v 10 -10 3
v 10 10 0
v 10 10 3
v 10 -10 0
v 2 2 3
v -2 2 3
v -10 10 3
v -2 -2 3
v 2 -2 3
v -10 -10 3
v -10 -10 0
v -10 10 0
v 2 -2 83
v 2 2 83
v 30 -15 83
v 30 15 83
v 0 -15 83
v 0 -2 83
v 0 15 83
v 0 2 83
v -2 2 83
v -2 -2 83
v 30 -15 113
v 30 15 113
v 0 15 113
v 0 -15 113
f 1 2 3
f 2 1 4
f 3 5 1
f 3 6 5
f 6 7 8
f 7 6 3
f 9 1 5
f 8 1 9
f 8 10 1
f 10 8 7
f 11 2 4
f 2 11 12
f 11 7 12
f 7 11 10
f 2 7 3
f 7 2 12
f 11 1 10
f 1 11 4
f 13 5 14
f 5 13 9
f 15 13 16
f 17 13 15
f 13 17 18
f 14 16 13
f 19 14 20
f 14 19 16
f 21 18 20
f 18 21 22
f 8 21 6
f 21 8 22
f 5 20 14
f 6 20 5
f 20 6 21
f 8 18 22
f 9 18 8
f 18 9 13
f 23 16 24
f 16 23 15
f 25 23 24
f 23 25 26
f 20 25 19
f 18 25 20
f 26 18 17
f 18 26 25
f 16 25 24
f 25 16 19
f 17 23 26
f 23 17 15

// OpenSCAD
// Top-heavy lamp stand: small base, tall thin column, heavy lamp head
// offset to one side so the assembly's COM sits outside the base footprint.
//
// Demonstrates: stability_com_over_support WARN + physics_settles WARN. The
// COM-vs-support-polygon check fires deterministically; the MuJoCo sim
// confirms the design tips in motion as well.
//
// part: stand
// gravity: -z

base_w   = 20;
base_h   = 3;
column_w = 4;
column_h = 80;
head_w   = 30;
head_h   = 30;

module stand() {
    // Base
    translate([-base_w / 2, -base_w / 2, 0])
        cube([base_w, base_w, base_h]);
    // Column on the centre of the base
    translate([-column_w / 2, -column_w / 2, base_h])
        cube([column_w, column_w, column_h]);
    // Heavy head — offset in +x so the COM hangs outside the 20×20 base.
    translate([0, -head_w / 2, base_h + column_h])
        cube([head_w, head_w, head_h]);
}

module assembly() {
    stand();
}

assembly();
